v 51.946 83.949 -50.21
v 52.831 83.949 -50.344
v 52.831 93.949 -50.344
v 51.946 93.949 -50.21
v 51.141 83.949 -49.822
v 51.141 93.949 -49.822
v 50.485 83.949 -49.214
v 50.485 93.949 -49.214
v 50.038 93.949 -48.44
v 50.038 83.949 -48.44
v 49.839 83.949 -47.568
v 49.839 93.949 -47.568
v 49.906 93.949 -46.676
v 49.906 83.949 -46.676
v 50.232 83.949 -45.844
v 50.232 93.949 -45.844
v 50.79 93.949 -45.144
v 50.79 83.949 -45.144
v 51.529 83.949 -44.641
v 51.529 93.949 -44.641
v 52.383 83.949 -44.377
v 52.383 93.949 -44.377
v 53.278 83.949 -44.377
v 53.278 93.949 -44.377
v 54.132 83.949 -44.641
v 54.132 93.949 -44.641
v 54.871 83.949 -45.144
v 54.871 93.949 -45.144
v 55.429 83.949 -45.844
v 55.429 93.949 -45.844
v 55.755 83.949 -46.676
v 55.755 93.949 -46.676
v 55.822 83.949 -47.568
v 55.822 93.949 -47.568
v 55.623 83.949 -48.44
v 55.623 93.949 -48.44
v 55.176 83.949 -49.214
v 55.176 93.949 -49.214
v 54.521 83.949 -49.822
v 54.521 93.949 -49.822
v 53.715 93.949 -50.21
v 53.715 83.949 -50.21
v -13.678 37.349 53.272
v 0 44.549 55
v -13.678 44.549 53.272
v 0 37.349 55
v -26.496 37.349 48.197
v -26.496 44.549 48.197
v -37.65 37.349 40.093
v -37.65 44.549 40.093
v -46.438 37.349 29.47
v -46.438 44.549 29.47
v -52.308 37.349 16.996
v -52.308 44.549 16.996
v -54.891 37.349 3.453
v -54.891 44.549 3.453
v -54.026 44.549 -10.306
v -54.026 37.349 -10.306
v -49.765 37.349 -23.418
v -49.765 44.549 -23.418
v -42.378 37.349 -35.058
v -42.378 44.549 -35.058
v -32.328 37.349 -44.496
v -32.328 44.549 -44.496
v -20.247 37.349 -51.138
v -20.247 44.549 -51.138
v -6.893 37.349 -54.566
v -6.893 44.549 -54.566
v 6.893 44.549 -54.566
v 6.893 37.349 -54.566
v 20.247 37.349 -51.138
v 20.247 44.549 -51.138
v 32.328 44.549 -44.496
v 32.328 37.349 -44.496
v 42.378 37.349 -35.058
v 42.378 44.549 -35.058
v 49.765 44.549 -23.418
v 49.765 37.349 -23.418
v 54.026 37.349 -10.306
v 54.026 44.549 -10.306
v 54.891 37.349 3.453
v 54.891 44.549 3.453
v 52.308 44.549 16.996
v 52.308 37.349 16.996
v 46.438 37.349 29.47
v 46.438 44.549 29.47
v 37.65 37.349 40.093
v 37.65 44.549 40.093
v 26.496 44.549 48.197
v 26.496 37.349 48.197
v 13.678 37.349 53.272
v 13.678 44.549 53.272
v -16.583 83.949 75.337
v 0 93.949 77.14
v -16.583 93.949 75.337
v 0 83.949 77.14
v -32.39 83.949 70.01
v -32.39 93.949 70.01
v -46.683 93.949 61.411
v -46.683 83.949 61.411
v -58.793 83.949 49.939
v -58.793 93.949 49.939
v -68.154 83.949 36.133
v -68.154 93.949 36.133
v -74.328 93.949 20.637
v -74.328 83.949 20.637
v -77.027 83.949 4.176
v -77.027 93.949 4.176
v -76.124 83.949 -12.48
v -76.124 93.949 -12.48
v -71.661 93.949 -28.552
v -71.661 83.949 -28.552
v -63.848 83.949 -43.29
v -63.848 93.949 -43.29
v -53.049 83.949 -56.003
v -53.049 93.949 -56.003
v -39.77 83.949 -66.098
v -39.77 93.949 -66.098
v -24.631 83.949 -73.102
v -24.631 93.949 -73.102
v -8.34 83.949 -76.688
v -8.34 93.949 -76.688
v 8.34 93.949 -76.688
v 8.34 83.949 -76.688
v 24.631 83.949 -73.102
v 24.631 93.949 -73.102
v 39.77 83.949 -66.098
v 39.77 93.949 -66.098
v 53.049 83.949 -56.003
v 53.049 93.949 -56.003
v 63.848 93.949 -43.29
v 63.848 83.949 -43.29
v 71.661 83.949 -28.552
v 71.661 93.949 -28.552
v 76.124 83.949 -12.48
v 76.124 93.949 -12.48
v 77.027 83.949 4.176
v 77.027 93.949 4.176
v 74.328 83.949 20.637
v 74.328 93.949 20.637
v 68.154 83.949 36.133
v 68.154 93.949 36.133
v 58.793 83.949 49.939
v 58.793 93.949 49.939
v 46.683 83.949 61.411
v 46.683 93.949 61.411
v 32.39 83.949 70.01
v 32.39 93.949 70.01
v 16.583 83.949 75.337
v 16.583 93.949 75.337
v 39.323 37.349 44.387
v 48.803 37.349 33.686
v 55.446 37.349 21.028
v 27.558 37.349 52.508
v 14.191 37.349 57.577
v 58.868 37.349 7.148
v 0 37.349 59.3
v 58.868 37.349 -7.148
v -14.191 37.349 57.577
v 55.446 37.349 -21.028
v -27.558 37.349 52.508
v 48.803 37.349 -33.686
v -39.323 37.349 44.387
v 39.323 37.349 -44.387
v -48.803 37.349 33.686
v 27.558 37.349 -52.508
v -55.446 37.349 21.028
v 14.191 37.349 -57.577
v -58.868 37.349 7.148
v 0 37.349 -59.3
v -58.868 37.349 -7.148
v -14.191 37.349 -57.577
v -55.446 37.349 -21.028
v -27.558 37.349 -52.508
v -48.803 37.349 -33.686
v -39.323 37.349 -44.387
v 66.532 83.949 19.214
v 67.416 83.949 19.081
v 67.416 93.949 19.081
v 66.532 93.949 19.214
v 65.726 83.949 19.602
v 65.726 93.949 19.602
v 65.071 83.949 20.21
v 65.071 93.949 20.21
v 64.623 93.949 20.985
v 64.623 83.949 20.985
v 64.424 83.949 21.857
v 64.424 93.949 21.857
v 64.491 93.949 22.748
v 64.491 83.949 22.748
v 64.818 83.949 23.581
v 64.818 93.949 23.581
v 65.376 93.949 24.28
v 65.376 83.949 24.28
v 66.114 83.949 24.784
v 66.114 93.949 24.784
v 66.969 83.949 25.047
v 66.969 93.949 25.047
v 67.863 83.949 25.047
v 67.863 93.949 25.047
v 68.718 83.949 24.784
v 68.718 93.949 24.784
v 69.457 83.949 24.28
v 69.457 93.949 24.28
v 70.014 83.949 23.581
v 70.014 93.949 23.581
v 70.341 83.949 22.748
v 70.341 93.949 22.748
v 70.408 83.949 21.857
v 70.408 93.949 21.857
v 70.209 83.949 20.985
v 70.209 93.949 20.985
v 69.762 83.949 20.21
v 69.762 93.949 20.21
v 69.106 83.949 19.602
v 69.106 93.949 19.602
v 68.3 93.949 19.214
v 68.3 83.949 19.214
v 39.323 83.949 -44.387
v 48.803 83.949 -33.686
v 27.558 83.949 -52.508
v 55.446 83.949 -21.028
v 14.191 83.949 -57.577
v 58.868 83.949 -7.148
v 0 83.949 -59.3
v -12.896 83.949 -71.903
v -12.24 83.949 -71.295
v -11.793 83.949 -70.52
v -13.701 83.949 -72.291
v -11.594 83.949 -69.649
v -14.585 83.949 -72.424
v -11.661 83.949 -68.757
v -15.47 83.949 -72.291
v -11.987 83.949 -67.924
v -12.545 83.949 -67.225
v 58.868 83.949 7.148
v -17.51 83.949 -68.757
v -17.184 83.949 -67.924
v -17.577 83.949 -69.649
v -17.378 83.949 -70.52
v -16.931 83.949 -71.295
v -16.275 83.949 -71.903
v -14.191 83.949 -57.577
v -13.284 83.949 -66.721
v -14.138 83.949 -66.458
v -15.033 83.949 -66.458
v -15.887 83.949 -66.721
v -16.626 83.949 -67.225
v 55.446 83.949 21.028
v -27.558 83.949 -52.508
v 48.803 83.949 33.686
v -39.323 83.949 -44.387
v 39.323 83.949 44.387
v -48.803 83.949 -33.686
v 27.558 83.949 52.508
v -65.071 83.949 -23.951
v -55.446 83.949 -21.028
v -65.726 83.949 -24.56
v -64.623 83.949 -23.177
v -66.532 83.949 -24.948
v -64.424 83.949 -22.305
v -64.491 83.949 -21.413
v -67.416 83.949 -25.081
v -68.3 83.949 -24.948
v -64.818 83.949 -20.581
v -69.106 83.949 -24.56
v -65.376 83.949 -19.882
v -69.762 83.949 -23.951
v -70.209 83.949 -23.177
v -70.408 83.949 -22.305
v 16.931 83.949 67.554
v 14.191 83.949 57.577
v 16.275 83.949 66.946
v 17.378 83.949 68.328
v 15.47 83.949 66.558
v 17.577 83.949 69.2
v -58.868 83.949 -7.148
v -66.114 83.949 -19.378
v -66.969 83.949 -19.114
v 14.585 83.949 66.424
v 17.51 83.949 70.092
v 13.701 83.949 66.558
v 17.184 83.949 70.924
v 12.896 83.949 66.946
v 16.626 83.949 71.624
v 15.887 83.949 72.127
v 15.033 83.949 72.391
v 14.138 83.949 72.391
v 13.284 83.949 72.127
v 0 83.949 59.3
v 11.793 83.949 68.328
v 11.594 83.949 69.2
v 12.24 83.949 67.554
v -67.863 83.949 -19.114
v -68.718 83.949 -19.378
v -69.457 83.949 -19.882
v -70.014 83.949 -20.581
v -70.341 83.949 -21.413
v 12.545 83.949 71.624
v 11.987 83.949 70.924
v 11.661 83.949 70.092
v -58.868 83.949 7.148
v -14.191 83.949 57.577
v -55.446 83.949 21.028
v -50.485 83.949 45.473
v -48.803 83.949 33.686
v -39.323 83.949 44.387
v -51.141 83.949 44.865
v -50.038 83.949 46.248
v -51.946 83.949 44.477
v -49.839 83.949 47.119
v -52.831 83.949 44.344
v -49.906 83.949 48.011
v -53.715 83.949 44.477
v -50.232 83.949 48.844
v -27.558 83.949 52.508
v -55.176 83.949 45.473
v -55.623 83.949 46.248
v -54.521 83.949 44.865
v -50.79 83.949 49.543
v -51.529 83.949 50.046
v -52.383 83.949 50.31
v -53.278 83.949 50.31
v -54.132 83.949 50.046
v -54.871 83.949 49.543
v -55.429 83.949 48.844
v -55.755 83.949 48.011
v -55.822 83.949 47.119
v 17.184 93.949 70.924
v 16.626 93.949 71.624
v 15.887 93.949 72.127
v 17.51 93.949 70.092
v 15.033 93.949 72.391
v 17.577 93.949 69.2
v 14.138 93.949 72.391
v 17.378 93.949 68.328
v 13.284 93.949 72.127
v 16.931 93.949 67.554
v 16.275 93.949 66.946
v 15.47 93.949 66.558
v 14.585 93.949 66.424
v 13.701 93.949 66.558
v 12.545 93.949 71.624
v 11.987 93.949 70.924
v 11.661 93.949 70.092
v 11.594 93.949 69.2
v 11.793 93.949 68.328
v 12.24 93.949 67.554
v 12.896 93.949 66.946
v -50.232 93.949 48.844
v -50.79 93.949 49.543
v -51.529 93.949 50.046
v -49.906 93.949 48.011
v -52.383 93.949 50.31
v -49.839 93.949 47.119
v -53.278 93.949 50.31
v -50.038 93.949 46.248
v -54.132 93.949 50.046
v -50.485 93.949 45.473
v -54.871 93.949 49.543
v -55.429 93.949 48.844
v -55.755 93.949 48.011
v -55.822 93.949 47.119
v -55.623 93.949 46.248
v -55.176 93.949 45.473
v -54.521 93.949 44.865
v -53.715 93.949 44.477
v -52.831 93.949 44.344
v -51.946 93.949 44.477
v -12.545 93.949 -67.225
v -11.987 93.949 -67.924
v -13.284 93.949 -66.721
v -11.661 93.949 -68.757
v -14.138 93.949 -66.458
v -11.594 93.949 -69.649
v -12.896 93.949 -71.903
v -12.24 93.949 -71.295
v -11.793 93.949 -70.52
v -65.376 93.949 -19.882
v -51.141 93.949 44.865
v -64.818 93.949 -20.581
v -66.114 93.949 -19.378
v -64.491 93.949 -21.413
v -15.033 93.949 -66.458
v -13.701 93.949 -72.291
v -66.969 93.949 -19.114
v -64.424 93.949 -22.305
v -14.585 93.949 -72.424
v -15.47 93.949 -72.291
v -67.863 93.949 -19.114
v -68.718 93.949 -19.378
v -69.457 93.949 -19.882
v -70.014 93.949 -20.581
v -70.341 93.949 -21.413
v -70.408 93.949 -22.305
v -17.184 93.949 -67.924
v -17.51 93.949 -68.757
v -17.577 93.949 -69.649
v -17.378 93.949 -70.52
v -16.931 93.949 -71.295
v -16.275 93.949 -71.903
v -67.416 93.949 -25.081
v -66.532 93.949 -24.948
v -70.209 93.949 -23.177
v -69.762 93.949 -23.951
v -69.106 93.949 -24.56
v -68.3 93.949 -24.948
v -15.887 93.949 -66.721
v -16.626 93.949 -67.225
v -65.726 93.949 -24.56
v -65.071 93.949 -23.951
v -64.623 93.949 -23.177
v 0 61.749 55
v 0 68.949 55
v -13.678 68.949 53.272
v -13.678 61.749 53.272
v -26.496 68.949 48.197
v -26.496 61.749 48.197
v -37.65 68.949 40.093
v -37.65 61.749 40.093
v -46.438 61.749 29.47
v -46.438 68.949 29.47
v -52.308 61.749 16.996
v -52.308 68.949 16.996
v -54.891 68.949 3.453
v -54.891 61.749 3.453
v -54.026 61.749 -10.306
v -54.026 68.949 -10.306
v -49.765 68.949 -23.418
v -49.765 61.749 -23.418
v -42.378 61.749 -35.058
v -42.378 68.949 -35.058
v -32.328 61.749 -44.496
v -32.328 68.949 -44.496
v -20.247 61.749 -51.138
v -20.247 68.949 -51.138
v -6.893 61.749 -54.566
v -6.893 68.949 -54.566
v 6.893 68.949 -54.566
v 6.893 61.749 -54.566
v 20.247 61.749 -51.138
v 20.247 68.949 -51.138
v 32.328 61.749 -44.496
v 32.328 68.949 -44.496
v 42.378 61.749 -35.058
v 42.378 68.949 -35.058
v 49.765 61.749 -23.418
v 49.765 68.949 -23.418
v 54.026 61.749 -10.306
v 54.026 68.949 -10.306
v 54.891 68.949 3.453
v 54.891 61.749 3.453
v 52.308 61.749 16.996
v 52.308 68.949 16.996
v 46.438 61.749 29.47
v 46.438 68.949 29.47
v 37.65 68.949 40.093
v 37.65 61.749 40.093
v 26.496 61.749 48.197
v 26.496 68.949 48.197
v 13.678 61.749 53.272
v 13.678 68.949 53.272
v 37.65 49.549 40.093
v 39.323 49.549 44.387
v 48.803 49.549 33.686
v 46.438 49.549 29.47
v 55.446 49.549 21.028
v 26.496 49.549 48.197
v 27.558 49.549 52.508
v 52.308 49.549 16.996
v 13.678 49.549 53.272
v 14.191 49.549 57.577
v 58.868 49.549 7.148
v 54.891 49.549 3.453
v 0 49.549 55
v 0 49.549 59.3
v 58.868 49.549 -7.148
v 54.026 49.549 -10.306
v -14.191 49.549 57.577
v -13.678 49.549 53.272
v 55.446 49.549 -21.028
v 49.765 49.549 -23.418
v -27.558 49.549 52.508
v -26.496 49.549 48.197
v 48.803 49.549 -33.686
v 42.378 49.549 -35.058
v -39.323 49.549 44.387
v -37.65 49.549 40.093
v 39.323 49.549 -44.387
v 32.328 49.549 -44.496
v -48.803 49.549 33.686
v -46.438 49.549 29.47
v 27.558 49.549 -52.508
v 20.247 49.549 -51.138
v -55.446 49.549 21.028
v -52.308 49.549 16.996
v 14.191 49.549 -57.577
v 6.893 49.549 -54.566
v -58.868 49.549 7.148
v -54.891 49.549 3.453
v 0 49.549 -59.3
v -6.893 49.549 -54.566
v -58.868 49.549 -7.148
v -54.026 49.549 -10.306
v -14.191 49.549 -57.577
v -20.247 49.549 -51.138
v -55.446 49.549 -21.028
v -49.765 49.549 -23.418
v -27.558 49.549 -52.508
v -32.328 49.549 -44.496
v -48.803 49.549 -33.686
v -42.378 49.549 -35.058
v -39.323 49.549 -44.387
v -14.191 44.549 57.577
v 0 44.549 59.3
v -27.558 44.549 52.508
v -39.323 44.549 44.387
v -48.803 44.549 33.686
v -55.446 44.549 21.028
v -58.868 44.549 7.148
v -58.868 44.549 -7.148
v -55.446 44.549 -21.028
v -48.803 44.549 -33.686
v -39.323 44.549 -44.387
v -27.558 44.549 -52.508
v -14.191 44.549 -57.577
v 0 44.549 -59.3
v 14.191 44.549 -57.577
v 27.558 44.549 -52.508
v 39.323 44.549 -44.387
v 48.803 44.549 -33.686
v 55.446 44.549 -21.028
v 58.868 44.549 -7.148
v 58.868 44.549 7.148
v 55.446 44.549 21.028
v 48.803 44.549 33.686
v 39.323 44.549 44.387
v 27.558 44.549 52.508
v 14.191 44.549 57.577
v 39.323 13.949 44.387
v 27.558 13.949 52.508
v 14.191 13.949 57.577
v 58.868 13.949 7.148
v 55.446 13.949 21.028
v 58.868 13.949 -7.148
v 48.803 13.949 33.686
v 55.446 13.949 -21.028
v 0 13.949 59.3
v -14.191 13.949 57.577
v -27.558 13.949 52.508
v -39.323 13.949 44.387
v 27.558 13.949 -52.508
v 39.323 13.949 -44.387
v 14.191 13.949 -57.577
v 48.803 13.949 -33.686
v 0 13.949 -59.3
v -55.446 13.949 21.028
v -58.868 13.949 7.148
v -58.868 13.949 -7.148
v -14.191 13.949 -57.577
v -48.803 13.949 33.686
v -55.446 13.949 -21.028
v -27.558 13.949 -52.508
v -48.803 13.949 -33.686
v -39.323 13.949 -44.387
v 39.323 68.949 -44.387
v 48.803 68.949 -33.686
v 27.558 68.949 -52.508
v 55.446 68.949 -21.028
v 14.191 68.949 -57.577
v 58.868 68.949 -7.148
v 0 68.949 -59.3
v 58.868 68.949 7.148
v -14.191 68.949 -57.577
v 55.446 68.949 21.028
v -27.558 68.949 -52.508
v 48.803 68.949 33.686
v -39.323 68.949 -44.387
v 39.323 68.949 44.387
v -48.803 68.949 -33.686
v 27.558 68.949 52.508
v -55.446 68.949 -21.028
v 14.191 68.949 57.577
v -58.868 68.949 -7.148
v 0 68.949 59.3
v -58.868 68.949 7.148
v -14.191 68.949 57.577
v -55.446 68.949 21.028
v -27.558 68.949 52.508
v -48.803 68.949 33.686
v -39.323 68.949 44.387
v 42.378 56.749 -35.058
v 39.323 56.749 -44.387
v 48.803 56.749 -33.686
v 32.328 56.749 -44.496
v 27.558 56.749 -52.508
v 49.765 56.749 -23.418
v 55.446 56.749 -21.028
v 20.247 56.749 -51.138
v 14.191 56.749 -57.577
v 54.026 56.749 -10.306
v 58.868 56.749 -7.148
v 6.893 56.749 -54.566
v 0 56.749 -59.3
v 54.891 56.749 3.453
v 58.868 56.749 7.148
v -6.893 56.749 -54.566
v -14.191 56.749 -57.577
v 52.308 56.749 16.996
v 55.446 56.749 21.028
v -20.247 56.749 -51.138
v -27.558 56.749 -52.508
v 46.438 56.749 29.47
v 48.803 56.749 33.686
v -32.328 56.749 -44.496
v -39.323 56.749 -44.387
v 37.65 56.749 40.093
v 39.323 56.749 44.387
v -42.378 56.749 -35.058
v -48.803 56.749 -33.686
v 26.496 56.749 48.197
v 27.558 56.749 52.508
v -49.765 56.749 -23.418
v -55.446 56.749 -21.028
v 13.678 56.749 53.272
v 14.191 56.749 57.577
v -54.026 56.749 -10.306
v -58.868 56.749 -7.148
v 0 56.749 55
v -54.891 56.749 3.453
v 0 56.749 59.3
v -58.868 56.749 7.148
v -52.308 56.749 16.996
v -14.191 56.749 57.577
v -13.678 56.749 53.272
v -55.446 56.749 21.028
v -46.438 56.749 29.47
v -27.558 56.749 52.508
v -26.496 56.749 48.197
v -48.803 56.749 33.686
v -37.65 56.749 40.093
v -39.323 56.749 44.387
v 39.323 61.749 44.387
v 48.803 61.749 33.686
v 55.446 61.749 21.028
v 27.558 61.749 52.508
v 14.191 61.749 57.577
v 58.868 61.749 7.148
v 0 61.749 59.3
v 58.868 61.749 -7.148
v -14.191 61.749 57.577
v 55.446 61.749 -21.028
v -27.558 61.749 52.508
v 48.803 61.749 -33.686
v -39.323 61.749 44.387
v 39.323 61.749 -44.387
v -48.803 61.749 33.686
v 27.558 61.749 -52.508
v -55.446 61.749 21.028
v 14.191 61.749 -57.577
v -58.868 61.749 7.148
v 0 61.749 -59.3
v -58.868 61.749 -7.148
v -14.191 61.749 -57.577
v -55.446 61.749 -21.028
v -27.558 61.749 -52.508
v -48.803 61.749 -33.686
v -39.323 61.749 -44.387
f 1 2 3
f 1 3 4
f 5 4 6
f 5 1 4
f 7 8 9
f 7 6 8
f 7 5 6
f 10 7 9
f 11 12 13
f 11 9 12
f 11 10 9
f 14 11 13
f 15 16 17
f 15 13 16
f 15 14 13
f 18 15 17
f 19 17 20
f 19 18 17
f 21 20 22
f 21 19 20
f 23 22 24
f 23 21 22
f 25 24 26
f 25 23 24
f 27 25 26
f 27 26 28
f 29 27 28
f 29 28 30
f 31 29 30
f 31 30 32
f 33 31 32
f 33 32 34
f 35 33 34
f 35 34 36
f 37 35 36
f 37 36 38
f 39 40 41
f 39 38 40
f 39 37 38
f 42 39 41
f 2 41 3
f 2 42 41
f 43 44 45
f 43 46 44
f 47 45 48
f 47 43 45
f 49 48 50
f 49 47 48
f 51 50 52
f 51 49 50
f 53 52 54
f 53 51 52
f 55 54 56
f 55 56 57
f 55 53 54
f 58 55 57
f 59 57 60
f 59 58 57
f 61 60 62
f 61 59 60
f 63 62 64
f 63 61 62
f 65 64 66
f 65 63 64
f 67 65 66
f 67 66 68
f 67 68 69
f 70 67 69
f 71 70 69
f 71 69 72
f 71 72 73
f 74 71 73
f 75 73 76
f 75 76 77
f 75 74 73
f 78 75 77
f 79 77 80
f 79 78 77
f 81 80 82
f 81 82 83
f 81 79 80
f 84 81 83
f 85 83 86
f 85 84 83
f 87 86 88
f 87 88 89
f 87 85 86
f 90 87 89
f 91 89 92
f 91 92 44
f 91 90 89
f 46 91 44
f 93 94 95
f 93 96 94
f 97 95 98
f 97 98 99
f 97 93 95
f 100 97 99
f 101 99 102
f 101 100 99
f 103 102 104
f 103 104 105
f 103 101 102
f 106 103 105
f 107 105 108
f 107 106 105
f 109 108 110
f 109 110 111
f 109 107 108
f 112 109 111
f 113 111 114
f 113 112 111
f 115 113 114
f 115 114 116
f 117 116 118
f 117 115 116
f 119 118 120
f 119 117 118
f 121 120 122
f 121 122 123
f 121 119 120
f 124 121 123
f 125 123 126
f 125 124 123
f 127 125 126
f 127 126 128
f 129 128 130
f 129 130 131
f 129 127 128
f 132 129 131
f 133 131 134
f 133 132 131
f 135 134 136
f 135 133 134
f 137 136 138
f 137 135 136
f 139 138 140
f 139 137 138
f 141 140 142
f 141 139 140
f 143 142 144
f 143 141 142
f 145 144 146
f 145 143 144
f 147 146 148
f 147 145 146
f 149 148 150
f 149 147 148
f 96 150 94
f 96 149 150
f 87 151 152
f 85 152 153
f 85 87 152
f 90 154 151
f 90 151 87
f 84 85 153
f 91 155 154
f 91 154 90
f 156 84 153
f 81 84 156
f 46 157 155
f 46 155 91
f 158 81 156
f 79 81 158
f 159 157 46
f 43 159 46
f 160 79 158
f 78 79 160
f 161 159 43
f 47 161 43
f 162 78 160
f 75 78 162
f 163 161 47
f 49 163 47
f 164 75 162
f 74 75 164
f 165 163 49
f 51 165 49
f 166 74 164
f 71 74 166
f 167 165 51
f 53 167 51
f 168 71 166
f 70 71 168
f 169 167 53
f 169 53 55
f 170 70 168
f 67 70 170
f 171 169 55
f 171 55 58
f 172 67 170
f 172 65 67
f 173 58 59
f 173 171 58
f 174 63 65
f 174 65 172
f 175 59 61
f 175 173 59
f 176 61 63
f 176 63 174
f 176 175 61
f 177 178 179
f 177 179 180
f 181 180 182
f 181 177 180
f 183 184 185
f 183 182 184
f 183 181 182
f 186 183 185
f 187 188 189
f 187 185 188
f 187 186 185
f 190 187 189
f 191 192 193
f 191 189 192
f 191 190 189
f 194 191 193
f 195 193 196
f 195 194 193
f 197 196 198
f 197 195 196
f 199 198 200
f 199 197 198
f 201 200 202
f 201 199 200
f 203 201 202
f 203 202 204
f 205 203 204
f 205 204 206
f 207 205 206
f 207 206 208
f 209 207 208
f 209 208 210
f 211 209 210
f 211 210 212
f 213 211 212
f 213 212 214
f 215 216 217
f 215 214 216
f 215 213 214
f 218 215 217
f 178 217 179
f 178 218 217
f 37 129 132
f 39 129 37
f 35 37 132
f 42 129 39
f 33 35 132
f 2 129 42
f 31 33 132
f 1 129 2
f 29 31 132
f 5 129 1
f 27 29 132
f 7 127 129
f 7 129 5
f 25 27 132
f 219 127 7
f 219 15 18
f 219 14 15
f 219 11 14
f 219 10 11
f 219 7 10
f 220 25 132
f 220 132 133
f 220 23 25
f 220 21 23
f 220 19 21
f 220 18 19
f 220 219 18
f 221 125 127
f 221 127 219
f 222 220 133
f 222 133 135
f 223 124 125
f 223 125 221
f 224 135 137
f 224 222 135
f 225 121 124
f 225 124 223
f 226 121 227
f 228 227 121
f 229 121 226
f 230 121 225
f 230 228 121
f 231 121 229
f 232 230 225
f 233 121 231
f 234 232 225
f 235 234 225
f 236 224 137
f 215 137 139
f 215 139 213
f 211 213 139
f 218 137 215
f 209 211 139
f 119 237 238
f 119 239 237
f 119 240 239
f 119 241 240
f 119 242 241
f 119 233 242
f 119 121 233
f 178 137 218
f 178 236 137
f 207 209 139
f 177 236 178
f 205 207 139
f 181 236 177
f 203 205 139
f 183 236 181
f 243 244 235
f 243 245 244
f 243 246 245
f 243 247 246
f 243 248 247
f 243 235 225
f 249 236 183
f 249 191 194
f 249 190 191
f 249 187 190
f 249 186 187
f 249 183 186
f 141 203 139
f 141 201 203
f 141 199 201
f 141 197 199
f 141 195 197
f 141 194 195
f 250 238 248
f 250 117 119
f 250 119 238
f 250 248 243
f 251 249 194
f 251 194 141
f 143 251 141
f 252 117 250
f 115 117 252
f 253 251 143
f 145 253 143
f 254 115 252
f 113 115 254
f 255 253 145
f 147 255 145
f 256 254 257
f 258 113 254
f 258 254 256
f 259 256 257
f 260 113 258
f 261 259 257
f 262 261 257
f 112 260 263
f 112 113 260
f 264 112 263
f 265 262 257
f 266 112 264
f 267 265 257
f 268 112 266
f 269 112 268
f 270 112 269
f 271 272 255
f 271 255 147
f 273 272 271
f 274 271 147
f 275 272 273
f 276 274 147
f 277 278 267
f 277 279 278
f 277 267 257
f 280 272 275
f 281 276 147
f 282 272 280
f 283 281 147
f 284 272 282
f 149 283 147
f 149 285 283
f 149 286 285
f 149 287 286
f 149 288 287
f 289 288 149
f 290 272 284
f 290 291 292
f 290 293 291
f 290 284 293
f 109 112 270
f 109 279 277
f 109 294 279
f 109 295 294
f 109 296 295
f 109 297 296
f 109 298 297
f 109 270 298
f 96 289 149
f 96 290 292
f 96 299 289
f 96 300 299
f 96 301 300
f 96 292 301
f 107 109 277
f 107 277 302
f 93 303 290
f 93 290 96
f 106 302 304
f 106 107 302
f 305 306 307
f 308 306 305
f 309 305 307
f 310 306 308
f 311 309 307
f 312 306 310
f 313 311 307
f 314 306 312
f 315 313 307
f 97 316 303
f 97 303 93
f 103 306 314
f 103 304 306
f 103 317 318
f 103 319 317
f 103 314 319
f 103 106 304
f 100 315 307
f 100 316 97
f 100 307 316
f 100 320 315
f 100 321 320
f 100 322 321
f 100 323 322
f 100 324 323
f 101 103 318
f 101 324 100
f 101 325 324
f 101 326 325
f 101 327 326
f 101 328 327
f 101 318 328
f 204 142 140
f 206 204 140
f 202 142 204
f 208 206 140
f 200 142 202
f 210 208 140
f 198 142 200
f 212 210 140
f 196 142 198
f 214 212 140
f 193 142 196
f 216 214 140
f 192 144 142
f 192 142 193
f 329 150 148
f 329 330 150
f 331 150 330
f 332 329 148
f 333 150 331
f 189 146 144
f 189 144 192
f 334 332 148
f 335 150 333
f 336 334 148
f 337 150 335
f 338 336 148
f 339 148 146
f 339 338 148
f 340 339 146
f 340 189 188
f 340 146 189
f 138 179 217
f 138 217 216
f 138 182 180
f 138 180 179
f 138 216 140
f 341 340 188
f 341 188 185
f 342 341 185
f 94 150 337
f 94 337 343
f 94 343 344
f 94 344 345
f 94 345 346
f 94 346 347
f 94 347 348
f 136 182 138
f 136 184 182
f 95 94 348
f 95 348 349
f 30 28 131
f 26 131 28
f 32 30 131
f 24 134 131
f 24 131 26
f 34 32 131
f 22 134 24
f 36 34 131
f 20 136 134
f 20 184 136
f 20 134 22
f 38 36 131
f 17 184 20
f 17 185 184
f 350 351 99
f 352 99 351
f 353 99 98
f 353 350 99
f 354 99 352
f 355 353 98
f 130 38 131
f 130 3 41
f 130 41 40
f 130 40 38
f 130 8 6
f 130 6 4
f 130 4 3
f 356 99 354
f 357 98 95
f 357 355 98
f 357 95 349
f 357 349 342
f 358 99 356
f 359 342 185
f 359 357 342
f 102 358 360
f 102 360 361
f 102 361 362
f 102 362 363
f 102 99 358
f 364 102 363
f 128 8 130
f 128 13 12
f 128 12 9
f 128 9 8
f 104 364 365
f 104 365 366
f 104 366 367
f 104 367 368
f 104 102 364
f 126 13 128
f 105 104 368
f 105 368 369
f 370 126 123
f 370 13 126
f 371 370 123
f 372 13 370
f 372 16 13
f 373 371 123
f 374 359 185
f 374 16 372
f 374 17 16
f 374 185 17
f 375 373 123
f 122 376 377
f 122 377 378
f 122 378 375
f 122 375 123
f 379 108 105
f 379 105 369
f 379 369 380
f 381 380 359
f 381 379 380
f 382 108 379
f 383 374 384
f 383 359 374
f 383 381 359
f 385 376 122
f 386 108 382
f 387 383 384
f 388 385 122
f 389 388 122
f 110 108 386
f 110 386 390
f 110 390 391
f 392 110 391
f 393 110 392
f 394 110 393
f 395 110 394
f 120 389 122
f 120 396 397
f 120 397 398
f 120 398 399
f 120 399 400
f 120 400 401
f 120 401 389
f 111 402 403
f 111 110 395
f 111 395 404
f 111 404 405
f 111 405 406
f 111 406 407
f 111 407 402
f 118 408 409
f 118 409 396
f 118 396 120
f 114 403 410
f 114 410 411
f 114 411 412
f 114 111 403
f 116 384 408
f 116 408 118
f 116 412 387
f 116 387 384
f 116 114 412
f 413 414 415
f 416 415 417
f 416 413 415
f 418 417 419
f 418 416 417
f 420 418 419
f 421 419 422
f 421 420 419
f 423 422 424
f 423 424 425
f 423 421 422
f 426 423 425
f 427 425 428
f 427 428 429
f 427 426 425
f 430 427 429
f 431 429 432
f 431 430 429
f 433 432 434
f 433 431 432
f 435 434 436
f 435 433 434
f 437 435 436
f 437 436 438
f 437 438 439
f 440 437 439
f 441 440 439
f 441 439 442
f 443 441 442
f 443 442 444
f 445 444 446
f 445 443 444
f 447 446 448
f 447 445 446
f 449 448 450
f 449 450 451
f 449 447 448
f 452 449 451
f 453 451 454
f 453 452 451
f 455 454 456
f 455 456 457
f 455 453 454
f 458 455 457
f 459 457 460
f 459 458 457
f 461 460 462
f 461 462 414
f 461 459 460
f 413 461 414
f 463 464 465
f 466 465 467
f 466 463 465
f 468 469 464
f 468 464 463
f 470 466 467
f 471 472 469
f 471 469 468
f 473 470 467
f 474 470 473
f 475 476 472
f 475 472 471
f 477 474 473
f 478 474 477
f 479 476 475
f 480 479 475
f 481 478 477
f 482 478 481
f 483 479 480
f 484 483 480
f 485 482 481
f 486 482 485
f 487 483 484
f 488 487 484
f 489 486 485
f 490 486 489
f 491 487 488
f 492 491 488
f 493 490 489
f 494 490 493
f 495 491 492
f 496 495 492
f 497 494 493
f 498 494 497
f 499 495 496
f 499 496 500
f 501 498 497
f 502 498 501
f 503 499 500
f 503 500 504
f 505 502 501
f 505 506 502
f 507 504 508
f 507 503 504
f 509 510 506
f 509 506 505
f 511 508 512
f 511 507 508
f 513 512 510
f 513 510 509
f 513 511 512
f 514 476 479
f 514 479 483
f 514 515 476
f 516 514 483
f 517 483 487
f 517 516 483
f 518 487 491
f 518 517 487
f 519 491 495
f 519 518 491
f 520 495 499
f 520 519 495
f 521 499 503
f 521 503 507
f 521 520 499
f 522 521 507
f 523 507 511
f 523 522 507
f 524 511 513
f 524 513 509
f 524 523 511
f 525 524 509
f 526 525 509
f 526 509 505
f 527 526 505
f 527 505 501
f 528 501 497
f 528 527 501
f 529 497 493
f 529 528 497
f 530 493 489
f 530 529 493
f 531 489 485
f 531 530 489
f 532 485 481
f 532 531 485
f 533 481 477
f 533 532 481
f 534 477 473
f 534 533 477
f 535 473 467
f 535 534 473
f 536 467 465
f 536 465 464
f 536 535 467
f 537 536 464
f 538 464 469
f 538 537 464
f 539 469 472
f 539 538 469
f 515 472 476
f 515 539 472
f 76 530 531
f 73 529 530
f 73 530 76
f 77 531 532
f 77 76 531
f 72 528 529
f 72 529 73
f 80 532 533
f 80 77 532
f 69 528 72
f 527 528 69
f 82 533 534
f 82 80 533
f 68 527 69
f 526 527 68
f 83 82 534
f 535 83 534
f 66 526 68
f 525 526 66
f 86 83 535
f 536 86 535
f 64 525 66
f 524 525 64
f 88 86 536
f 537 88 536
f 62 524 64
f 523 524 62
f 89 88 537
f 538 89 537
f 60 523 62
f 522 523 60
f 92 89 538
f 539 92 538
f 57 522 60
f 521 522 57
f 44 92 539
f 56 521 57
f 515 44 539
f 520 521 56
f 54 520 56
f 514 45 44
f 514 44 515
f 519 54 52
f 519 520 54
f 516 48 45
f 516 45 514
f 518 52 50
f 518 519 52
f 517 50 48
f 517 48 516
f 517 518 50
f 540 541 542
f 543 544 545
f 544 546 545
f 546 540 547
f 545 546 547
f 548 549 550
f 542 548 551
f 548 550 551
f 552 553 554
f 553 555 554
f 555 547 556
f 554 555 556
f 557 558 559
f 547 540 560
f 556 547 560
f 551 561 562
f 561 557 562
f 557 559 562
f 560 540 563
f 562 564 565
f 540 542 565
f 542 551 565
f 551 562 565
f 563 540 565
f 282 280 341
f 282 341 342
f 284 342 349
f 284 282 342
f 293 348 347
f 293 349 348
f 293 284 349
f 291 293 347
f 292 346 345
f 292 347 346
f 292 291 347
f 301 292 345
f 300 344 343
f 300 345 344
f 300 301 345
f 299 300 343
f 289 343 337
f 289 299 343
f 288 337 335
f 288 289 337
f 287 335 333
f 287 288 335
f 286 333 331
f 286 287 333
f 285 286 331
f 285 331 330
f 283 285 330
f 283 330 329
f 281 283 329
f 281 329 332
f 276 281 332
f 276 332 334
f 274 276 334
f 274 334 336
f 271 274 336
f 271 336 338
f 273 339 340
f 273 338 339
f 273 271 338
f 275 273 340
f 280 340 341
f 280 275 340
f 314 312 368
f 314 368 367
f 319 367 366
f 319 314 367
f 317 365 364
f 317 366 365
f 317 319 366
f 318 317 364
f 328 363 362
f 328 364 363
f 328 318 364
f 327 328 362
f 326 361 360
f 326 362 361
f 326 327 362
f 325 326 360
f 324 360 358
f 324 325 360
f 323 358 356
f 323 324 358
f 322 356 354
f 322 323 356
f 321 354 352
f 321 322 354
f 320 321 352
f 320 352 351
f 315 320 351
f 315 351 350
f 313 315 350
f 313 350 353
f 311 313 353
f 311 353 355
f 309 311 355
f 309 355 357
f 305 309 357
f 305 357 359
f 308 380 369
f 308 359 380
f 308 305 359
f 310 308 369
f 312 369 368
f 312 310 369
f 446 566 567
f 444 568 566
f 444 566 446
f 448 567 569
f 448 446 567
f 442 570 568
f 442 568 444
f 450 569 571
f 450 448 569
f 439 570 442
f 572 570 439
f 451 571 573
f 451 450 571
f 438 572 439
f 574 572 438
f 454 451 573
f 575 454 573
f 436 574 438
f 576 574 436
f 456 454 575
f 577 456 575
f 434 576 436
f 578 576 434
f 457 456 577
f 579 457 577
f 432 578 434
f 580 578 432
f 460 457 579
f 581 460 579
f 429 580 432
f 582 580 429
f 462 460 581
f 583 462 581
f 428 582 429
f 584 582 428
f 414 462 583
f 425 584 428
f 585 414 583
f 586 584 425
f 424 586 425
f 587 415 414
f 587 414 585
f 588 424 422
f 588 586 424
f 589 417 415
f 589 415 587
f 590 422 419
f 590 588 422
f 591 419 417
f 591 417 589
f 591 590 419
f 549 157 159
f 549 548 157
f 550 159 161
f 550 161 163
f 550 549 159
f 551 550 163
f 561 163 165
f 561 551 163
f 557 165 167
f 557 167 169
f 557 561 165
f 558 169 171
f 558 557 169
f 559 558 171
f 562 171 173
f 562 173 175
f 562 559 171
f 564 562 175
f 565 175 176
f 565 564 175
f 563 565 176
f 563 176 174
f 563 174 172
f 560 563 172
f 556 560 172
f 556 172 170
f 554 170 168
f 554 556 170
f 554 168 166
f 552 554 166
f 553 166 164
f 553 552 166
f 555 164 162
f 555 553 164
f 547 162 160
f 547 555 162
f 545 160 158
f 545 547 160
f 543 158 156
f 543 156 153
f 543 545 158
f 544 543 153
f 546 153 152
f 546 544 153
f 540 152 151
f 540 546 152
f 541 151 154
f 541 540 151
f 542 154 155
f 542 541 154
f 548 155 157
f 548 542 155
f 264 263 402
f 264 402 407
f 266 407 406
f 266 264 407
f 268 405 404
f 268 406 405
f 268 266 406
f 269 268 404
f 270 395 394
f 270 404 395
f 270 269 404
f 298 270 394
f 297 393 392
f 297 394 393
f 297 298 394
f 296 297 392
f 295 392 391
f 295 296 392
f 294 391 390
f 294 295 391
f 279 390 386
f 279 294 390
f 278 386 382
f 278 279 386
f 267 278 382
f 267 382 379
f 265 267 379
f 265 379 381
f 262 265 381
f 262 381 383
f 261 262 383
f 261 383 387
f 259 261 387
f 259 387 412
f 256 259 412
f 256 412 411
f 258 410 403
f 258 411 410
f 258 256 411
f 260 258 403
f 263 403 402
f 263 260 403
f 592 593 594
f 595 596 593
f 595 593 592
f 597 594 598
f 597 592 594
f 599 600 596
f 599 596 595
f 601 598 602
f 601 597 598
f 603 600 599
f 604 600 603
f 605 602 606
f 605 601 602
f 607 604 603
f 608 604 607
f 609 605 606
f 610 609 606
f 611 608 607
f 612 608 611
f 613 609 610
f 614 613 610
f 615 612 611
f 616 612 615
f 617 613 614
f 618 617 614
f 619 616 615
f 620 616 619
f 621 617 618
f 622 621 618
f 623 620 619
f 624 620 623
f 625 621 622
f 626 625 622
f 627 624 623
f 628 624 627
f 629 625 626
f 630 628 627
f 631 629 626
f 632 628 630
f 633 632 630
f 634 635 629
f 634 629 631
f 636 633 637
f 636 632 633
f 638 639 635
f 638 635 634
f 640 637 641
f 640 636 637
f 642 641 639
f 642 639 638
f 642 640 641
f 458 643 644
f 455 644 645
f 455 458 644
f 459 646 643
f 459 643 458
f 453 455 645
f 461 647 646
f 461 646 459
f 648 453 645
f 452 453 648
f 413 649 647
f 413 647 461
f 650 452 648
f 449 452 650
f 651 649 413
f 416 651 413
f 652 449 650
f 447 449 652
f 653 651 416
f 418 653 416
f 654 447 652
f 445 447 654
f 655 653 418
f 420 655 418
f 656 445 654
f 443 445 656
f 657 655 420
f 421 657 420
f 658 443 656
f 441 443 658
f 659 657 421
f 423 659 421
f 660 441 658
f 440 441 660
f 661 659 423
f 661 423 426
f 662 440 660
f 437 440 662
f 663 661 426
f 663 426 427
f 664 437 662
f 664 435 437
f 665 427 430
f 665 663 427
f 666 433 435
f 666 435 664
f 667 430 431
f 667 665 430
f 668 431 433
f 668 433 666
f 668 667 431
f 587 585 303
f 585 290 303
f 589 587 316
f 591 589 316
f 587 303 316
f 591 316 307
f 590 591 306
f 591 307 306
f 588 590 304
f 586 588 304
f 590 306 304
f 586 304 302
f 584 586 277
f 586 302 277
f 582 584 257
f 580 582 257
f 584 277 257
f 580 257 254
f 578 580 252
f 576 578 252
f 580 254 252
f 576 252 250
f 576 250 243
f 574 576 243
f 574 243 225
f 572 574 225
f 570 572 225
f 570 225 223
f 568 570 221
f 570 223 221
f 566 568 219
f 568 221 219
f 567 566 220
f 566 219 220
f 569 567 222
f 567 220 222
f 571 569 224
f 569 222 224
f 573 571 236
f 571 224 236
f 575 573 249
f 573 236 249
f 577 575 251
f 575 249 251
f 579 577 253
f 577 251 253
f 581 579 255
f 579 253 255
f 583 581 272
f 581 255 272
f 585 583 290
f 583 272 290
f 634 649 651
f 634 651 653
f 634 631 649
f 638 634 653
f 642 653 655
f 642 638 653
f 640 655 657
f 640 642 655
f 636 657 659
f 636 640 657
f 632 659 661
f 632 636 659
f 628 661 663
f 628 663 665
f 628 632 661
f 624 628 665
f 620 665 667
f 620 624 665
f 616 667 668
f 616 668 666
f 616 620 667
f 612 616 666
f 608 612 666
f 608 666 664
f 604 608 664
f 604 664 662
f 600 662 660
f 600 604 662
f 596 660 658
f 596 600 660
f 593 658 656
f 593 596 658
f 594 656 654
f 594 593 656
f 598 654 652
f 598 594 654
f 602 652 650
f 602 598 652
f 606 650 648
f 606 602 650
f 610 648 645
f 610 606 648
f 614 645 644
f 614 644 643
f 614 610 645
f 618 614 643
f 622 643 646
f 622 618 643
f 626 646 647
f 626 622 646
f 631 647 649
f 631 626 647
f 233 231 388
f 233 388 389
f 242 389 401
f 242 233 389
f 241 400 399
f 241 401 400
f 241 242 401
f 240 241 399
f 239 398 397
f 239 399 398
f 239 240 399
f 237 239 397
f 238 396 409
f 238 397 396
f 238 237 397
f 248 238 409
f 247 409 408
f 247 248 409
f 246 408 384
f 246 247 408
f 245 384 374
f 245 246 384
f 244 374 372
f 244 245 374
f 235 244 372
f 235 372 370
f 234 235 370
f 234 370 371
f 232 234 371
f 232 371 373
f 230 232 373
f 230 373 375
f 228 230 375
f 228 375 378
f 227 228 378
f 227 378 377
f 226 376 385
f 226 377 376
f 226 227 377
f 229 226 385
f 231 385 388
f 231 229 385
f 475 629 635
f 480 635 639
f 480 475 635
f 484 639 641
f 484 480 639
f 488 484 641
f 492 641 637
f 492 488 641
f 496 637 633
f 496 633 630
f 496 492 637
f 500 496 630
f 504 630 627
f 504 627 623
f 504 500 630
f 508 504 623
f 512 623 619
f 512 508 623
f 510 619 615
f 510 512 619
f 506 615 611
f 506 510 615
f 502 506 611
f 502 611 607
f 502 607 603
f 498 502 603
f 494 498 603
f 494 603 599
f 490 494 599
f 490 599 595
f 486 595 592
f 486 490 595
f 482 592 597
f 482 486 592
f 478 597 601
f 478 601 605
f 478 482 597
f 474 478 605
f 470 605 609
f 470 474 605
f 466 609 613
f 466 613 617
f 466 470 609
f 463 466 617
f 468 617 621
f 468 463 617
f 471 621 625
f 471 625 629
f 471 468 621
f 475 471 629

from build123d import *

# Parameters (mm, degrees)
ESQUISSE2_R             = 3
ENL_V_MAT_EXTRU_1_DEPTH = 164


with BuildPart() as part:
    # Esquisse1 → Révolution2 (revolve)
    with BuildSketch(Plane.XY, mode=Mode.PRIVATE) as r_volution2_sk:
        Polygon((0, 93.9493256), (77.14, 93.9493256), (77.14, 83.9493256), (59.3, 83.9493256), (59.3, 73.9493256), (59.3, 68.9493256), (55, 68.9493256), (55, 61.7493256), (59.3, 61.7493256), (59.3, 56.7493256), (55, 56.7493256), (55, 49.5493256), (59.3, 49.5493256), (59.3, 44.5493256), (55, 44.5493256), (55, 37.3493256), (59.3, 37.3493256), (59.3, 13.9493256), (55, 13.9493256), (0, 13.9493256), align=None)
    revolve(r_volution2_sk.sketch.rotate(Axis((0, 93.9493256, 0), (0, -1, 0)), 90), axis=Axis((0, 93.9493256, 0), (0, -1, 0)))  # turned: the seam where the file's is

    # Esquisse2 → Enlèv. mat.-Extru.1 (cut)
    with BuildSketch(Plane(origin=(0, 0, 0), x_dir=(1, 0, 0), z_dir=(0, 1, 0))):
        with Locations(Location((14.585474317, -69.42440161, 0), (0, 0, 90))):  # turned: the seam where the file's is
            Circle(ESQUISSE2_R)
        with Locations(Location((67.416032595, -22.080809521, 0), (0, 0, 90))):  # turned: the seam where the file's is
            Circle(ESQUISSE2_R)
        with Locations(Location((52.830558279, 47.34359209, 0), (0, 0, 90))):  # turned: the seam where the file's is
            Circle(ESQUISSE2_R)
        with Locations(Location((-14.585474317, 69.42440161, 0), (0, 0, 90))):  # turned: the seam where the file's is
            Circle(ESQUISSE2_R)
        with Locations(Location((-67.416032595, 22.080809521, 0), (0, 0, 90))):  # turned: the seam where the file's is
            Circle(ESQUISSE2_R)
        with Locations(Location((-52.830558279, -47.34359209, 0), (0, 0, 90))):  # turned: the seam where the file's is
            Circle(ESQUISSE2_R)
    extrude(amount=ENL_V_MAT_EXTRU_1_DEPTH, mode=Mode.SUBTRACT)


solid = part.part
